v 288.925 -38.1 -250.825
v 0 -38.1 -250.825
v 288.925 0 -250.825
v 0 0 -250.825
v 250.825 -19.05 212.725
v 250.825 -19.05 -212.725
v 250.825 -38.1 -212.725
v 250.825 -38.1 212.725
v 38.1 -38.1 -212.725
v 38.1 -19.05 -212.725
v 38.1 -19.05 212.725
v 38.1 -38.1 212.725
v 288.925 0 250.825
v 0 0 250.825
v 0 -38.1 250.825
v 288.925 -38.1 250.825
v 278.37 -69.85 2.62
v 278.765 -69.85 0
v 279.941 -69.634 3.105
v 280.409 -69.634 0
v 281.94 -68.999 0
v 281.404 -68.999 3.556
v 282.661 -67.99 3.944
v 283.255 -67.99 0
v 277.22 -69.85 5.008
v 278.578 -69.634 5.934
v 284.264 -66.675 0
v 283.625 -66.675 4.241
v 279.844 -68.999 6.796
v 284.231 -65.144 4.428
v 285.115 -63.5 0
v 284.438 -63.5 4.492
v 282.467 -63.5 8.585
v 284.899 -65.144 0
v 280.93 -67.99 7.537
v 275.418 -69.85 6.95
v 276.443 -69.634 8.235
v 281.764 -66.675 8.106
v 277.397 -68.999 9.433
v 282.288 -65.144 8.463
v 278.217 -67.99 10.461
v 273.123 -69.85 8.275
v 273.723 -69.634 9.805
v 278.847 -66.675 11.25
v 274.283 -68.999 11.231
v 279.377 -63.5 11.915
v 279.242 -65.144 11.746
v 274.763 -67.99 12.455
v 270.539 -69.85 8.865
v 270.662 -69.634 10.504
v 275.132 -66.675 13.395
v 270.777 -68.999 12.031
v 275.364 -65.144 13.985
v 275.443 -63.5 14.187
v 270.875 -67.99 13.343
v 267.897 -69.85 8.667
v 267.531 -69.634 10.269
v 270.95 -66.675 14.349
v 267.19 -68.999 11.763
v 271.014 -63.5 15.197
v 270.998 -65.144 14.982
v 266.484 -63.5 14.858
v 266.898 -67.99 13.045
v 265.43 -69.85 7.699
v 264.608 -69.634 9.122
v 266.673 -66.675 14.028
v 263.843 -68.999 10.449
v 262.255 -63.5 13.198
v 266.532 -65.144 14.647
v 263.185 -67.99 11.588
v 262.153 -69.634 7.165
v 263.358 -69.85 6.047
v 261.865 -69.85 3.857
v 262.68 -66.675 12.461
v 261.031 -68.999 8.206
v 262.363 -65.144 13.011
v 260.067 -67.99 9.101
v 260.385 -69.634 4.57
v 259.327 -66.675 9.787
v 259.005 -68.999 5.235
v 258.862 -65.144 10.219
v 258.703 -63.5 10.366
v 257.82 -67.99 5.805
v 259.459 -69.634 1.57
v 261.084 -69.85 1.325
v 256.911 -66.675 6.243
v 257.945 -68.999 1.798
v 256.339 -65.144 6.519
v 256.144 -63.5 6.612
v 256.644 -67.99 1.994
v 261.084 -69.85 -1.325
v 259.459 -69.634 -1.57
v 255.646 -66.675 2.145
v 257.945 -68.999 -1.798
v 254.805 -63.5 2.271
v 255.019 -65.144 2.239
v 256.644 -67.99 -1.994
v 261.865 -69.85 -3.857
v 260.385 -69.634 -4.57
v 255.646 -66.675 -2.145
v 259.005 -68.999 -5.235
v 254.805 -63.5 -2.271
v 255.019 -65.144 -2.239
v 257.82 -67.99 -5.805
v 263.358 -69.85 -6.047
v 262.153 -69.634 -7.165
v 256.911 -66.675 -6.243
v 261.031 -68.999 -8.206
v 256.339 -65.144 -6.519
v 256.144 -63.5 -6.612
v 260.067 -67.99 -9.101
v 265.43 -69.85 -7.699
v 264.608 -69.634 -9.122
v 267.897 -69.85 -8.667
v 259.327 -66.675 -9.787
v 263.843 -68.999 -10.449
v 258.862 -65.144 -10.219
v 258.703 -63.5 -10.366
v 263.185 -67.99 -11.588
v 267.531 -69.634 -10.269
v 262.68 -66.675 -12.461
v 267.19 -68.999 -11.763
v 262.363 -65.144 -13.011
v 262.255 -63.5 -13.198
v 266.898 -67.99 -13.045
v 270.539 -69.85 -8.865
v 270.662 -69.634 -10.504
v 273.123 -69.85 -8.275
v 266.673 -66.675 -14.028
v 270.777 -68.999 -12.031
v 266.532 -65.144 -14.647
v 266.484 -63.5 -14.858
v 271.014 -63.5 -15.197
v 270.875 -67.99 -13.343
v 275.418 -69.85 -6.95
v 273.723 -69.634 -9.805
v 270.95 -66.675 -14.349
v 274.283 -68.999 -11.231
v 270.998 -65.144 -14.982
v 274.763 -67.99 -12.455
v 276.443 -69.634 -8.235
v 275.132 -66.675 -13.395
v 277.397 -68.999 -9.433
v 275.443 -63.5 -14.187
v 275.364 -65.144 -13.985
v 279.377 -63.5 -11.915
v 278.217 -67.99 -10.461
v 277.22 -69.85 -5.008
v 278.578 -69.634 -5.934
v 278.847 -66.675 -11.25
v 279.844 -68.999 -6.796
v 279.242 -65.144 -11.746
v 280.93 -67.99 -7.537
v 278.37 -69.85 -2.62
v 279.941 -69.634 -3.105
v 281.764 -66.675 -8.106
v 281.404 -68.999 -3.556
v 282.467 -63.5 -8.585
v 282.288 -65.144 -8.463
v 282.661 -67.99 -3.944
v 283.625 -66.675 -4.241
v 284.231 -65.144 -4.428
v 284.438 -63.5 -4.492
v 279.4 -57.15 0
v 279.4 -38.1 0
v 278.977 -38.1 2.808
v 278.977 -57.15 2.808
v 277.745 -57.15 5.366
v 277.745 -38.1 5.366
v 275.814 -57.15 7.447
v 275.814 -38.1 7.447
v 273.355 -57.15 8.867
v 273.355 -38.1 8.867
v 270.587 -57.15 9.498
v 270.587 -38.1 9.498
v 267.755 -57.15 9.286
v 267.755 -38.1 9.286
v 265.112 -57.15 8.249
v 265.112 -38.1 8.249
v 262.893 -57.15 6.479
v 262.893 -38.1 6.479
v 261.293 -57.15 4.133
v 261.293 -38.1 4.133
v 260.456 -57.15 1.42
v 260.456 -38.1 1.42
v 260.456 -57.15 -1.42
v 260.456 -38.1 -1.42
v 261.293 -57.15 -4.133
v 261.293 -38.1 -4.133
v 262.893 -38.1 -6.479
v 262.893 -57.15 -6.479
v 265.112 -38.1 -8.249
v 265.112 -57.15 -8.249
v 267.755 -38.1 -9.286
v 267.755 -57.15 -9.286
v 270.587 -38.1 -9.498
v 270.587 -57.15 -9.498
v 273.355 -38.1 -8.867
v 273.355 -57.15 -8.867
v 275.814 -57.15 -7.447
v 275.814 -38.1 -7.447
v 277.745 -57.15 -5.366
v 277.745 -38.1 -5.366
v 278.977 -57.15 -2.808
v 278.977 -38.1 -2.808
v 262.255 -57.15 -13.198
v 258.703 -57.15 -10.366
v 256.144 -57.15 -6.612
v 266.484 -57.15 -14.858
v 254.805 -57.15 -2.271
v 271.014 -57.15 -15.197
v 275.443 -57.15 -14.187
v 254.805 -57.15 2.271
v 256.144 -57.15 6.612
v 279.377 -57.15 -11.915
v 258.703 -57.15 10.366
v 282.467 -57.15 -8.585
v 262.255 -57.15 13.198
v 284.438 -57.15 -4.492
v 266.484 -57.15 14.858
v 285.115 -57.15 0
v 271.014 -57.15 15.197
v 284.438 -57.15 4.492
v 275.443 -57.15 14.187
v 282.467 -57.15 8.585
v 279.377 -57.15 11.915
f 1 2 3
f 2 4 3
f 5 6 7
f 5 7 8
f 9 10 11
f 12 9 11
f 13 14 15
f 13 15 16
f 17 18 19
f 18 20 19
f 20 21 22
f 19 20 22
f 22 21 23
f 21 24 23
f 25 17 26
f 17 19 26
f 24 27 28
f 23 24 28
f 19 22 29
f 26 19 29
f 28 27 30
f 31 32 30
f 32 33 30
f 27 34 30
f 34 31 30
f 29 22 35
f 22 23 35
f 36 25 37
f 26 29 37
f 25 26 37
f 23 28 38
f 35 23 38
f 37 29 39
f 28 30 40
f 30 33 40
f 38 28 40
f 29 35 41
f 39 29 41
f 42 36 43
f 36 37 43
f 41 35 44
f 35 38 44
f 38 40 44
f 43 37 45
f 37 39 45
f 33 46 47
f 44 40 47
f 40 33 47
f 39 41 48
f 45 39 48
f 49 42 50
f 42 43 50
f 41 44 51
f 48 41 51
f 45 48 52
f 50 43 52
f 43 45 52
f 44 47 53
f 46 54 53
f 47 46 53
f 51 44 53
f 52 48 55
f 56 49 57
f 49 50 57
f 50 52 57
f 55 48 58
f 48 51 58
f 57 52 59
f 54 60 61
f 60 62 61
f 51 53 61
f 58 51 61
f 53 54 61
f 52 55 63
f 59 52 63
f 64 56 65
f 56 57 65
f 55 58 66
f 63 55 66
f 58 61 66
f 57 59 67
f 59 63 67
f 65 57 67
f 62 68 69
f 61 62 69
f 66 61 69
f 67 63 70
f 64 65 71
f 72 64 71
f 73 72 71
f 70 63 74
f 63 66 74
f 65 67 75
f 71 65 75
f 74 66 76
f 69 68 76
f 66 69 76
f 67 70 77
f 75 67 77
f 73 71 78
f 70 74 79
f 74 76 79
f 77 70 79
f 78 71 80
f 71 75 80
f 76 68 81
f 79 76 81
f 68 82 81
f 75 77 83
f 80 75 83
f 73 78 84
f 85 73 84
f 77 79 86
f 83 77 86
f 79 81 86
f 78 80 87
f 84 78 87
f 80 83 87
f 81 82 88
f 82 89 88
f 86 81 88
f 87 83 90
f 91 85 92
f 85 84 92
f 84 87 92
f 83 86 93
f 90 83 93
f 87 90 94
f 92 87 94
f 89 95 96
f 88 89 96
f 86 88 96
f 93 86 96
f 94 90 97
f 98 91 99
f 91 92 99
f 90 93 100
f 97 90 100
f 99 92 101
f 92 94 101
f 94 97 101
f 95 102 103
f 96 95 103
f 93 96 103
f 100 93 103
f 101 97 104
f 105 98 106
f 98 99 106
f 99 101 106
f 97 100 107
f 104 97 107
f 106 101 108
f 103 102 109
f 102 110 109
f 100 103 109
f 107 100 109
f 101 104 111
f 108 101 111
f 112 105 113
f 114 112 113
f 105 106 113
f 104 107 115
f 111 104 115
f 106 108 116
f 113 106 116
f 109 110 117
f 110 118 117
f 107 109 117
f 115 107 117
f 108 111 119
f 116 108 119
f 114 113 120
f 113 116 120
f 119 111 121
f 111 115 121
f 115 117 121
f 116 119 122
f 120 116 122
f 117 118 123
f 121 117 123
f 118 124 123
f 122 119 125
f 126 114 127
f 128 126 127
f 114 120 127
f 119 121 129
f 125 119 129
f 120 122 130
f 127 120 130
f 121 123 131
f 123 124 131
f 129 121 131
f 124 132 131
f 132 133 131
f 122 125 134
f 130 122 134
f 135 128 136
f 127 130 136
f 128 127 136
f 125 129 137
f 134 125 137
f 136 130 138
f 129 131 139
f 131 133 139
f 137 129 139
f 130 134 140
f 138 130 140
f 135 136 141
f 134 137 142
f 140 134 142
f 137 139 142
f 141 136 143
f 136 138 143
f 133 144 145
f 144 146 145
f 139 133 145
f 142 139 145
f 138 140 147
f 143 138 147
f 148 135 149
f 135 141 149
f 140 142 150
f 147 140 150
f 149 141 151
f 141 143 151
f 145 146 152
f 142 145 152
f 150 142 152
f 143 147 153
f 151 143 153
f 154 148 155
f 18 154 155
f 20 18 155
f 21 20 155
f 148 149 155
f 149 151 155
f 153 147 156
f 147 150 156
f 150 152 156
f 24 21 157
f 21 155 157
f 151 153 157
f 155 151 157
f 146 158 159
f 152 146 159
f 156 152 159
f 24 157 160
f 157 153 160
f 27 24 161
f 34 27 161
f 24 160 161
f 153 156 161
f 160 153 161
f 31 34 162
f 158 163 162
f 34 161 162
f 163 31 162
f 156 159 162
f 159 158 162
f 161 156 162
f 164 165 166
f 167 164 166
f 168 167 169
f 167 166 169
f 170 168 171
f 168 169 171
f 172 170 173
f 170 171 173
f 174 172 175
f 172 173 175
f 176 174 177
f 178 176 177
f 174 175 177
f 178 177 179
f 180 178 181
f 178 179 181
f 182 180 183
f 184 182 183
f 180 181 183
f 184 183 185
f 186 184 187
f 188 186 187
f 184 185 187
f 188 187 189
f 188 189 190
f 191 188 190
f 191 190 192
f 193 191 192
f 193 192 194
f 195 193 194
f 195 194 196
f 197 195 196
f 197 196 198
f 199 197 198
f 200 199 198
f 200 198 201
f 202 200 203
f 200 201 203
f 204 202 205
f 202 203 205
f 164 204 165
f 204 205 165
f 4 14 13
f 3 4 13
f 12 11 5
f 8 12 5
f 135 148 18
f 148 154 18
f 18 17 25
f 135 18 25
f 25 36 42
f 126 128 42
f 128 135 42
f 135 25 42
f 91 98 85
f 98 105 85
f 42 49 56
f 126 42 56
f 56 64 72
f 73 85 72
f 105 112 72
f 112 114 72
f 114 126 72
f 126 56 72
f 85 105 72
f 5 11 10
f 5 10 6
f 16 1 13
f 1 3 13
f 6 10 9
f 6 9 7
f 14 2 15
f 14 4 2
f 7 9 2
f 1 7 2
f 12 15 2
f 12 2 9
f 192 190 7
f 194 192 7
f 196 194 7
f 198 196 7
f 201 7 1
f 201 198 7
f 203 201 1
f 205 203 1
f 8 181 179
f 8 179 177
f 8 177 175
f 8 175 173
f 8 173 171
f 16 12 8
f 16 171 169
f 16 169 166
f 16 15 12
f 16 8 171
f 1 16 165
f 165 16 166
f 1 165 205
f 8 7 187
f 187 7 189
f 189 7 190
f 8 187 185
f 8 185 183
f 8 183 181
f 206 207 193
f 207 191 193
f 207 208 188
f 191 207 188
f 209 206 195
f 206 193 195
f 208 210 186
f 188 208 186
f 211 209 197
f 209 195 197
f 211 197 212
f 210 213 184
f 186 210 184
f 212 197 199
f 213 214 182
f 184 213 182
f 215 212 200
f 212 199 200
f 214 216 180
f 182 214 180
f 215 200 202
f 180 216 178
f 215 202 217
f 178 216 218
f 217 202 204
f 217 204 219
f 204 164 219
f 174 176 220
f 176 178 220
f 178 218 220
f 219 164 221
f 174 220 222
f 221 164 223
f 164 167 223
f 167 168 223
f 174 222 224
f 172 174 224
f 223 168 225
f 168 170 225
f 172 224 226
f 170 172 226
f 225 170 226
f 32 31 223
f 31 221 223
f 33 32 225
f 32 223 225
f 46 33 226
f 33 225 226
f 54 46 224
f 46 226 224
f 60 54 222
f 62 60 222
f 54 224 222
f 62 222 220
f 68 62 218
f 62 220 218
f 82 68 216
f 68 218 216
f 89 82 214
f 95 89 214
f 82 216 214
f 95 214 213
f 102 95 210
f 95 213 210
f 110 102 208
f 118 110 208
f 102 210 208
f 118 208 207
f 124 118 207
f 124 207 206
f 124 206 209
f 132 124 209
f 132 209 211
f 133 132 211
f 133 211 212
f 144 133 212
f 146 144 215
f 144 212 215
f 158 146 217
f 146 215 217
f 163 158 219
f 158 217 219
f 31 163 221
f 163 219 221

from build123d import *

# Parameters (mm, degrees)
F0_W     = 288.925
F0_H     = 501.65
F1_DEPTH = 19.05
F2_W     = 288.925
F2_H     = 501.65
F2_W_2   = 212.725
F2_H_2   = 425.45
F3_DEPTH = 19.05


with BuildPart() as f1:
    # F0 (on Front) → F1 (new body)
    with BuildSketch(Plane.XZ):
        with Locations((144.4625, 0)):
            Rectangle(F0_W, F0_H)
    extrude(amount=F1_DEPTH)

    # F2 (on face) → F3 (join)
    with BuildSketch(Plane.XZ.offset(19.05)):
        with Locations((144.4625, 0)):
            Rectangle(F2_W, F2_H)
        with Locations((144.4625, 0)):
            Rectangle(F2_W_2, F2_H_2, mode=Mode.SUBTRACT)
    extrude(amount=F3_DEPTH)

    # F4 (on Top) → F5 (revolve)
    with BuildSketch(Plane.XY):
        with BuildLine():
            Line((279.4, -57.15), (279.4, 0))
            Line((279.4, 0), (269.875, 0))
            Line((269.875, 0), (269.875, -69.85))
            Line((269.875, -69.85), (278.765, -69.85))
            ThreePointArc((278.765, -69.85), (283.255128, -67.990128), (285.115, -63.5))
            Line((285.115, -63.5), (285.115, -57.15))
            Line((285.115, -57.15), (279.4, -57.15))
        make_face()
    revolve(axis=Axis((269.875, -127, 0), (0, -1, 0)))


solid = f1.part
